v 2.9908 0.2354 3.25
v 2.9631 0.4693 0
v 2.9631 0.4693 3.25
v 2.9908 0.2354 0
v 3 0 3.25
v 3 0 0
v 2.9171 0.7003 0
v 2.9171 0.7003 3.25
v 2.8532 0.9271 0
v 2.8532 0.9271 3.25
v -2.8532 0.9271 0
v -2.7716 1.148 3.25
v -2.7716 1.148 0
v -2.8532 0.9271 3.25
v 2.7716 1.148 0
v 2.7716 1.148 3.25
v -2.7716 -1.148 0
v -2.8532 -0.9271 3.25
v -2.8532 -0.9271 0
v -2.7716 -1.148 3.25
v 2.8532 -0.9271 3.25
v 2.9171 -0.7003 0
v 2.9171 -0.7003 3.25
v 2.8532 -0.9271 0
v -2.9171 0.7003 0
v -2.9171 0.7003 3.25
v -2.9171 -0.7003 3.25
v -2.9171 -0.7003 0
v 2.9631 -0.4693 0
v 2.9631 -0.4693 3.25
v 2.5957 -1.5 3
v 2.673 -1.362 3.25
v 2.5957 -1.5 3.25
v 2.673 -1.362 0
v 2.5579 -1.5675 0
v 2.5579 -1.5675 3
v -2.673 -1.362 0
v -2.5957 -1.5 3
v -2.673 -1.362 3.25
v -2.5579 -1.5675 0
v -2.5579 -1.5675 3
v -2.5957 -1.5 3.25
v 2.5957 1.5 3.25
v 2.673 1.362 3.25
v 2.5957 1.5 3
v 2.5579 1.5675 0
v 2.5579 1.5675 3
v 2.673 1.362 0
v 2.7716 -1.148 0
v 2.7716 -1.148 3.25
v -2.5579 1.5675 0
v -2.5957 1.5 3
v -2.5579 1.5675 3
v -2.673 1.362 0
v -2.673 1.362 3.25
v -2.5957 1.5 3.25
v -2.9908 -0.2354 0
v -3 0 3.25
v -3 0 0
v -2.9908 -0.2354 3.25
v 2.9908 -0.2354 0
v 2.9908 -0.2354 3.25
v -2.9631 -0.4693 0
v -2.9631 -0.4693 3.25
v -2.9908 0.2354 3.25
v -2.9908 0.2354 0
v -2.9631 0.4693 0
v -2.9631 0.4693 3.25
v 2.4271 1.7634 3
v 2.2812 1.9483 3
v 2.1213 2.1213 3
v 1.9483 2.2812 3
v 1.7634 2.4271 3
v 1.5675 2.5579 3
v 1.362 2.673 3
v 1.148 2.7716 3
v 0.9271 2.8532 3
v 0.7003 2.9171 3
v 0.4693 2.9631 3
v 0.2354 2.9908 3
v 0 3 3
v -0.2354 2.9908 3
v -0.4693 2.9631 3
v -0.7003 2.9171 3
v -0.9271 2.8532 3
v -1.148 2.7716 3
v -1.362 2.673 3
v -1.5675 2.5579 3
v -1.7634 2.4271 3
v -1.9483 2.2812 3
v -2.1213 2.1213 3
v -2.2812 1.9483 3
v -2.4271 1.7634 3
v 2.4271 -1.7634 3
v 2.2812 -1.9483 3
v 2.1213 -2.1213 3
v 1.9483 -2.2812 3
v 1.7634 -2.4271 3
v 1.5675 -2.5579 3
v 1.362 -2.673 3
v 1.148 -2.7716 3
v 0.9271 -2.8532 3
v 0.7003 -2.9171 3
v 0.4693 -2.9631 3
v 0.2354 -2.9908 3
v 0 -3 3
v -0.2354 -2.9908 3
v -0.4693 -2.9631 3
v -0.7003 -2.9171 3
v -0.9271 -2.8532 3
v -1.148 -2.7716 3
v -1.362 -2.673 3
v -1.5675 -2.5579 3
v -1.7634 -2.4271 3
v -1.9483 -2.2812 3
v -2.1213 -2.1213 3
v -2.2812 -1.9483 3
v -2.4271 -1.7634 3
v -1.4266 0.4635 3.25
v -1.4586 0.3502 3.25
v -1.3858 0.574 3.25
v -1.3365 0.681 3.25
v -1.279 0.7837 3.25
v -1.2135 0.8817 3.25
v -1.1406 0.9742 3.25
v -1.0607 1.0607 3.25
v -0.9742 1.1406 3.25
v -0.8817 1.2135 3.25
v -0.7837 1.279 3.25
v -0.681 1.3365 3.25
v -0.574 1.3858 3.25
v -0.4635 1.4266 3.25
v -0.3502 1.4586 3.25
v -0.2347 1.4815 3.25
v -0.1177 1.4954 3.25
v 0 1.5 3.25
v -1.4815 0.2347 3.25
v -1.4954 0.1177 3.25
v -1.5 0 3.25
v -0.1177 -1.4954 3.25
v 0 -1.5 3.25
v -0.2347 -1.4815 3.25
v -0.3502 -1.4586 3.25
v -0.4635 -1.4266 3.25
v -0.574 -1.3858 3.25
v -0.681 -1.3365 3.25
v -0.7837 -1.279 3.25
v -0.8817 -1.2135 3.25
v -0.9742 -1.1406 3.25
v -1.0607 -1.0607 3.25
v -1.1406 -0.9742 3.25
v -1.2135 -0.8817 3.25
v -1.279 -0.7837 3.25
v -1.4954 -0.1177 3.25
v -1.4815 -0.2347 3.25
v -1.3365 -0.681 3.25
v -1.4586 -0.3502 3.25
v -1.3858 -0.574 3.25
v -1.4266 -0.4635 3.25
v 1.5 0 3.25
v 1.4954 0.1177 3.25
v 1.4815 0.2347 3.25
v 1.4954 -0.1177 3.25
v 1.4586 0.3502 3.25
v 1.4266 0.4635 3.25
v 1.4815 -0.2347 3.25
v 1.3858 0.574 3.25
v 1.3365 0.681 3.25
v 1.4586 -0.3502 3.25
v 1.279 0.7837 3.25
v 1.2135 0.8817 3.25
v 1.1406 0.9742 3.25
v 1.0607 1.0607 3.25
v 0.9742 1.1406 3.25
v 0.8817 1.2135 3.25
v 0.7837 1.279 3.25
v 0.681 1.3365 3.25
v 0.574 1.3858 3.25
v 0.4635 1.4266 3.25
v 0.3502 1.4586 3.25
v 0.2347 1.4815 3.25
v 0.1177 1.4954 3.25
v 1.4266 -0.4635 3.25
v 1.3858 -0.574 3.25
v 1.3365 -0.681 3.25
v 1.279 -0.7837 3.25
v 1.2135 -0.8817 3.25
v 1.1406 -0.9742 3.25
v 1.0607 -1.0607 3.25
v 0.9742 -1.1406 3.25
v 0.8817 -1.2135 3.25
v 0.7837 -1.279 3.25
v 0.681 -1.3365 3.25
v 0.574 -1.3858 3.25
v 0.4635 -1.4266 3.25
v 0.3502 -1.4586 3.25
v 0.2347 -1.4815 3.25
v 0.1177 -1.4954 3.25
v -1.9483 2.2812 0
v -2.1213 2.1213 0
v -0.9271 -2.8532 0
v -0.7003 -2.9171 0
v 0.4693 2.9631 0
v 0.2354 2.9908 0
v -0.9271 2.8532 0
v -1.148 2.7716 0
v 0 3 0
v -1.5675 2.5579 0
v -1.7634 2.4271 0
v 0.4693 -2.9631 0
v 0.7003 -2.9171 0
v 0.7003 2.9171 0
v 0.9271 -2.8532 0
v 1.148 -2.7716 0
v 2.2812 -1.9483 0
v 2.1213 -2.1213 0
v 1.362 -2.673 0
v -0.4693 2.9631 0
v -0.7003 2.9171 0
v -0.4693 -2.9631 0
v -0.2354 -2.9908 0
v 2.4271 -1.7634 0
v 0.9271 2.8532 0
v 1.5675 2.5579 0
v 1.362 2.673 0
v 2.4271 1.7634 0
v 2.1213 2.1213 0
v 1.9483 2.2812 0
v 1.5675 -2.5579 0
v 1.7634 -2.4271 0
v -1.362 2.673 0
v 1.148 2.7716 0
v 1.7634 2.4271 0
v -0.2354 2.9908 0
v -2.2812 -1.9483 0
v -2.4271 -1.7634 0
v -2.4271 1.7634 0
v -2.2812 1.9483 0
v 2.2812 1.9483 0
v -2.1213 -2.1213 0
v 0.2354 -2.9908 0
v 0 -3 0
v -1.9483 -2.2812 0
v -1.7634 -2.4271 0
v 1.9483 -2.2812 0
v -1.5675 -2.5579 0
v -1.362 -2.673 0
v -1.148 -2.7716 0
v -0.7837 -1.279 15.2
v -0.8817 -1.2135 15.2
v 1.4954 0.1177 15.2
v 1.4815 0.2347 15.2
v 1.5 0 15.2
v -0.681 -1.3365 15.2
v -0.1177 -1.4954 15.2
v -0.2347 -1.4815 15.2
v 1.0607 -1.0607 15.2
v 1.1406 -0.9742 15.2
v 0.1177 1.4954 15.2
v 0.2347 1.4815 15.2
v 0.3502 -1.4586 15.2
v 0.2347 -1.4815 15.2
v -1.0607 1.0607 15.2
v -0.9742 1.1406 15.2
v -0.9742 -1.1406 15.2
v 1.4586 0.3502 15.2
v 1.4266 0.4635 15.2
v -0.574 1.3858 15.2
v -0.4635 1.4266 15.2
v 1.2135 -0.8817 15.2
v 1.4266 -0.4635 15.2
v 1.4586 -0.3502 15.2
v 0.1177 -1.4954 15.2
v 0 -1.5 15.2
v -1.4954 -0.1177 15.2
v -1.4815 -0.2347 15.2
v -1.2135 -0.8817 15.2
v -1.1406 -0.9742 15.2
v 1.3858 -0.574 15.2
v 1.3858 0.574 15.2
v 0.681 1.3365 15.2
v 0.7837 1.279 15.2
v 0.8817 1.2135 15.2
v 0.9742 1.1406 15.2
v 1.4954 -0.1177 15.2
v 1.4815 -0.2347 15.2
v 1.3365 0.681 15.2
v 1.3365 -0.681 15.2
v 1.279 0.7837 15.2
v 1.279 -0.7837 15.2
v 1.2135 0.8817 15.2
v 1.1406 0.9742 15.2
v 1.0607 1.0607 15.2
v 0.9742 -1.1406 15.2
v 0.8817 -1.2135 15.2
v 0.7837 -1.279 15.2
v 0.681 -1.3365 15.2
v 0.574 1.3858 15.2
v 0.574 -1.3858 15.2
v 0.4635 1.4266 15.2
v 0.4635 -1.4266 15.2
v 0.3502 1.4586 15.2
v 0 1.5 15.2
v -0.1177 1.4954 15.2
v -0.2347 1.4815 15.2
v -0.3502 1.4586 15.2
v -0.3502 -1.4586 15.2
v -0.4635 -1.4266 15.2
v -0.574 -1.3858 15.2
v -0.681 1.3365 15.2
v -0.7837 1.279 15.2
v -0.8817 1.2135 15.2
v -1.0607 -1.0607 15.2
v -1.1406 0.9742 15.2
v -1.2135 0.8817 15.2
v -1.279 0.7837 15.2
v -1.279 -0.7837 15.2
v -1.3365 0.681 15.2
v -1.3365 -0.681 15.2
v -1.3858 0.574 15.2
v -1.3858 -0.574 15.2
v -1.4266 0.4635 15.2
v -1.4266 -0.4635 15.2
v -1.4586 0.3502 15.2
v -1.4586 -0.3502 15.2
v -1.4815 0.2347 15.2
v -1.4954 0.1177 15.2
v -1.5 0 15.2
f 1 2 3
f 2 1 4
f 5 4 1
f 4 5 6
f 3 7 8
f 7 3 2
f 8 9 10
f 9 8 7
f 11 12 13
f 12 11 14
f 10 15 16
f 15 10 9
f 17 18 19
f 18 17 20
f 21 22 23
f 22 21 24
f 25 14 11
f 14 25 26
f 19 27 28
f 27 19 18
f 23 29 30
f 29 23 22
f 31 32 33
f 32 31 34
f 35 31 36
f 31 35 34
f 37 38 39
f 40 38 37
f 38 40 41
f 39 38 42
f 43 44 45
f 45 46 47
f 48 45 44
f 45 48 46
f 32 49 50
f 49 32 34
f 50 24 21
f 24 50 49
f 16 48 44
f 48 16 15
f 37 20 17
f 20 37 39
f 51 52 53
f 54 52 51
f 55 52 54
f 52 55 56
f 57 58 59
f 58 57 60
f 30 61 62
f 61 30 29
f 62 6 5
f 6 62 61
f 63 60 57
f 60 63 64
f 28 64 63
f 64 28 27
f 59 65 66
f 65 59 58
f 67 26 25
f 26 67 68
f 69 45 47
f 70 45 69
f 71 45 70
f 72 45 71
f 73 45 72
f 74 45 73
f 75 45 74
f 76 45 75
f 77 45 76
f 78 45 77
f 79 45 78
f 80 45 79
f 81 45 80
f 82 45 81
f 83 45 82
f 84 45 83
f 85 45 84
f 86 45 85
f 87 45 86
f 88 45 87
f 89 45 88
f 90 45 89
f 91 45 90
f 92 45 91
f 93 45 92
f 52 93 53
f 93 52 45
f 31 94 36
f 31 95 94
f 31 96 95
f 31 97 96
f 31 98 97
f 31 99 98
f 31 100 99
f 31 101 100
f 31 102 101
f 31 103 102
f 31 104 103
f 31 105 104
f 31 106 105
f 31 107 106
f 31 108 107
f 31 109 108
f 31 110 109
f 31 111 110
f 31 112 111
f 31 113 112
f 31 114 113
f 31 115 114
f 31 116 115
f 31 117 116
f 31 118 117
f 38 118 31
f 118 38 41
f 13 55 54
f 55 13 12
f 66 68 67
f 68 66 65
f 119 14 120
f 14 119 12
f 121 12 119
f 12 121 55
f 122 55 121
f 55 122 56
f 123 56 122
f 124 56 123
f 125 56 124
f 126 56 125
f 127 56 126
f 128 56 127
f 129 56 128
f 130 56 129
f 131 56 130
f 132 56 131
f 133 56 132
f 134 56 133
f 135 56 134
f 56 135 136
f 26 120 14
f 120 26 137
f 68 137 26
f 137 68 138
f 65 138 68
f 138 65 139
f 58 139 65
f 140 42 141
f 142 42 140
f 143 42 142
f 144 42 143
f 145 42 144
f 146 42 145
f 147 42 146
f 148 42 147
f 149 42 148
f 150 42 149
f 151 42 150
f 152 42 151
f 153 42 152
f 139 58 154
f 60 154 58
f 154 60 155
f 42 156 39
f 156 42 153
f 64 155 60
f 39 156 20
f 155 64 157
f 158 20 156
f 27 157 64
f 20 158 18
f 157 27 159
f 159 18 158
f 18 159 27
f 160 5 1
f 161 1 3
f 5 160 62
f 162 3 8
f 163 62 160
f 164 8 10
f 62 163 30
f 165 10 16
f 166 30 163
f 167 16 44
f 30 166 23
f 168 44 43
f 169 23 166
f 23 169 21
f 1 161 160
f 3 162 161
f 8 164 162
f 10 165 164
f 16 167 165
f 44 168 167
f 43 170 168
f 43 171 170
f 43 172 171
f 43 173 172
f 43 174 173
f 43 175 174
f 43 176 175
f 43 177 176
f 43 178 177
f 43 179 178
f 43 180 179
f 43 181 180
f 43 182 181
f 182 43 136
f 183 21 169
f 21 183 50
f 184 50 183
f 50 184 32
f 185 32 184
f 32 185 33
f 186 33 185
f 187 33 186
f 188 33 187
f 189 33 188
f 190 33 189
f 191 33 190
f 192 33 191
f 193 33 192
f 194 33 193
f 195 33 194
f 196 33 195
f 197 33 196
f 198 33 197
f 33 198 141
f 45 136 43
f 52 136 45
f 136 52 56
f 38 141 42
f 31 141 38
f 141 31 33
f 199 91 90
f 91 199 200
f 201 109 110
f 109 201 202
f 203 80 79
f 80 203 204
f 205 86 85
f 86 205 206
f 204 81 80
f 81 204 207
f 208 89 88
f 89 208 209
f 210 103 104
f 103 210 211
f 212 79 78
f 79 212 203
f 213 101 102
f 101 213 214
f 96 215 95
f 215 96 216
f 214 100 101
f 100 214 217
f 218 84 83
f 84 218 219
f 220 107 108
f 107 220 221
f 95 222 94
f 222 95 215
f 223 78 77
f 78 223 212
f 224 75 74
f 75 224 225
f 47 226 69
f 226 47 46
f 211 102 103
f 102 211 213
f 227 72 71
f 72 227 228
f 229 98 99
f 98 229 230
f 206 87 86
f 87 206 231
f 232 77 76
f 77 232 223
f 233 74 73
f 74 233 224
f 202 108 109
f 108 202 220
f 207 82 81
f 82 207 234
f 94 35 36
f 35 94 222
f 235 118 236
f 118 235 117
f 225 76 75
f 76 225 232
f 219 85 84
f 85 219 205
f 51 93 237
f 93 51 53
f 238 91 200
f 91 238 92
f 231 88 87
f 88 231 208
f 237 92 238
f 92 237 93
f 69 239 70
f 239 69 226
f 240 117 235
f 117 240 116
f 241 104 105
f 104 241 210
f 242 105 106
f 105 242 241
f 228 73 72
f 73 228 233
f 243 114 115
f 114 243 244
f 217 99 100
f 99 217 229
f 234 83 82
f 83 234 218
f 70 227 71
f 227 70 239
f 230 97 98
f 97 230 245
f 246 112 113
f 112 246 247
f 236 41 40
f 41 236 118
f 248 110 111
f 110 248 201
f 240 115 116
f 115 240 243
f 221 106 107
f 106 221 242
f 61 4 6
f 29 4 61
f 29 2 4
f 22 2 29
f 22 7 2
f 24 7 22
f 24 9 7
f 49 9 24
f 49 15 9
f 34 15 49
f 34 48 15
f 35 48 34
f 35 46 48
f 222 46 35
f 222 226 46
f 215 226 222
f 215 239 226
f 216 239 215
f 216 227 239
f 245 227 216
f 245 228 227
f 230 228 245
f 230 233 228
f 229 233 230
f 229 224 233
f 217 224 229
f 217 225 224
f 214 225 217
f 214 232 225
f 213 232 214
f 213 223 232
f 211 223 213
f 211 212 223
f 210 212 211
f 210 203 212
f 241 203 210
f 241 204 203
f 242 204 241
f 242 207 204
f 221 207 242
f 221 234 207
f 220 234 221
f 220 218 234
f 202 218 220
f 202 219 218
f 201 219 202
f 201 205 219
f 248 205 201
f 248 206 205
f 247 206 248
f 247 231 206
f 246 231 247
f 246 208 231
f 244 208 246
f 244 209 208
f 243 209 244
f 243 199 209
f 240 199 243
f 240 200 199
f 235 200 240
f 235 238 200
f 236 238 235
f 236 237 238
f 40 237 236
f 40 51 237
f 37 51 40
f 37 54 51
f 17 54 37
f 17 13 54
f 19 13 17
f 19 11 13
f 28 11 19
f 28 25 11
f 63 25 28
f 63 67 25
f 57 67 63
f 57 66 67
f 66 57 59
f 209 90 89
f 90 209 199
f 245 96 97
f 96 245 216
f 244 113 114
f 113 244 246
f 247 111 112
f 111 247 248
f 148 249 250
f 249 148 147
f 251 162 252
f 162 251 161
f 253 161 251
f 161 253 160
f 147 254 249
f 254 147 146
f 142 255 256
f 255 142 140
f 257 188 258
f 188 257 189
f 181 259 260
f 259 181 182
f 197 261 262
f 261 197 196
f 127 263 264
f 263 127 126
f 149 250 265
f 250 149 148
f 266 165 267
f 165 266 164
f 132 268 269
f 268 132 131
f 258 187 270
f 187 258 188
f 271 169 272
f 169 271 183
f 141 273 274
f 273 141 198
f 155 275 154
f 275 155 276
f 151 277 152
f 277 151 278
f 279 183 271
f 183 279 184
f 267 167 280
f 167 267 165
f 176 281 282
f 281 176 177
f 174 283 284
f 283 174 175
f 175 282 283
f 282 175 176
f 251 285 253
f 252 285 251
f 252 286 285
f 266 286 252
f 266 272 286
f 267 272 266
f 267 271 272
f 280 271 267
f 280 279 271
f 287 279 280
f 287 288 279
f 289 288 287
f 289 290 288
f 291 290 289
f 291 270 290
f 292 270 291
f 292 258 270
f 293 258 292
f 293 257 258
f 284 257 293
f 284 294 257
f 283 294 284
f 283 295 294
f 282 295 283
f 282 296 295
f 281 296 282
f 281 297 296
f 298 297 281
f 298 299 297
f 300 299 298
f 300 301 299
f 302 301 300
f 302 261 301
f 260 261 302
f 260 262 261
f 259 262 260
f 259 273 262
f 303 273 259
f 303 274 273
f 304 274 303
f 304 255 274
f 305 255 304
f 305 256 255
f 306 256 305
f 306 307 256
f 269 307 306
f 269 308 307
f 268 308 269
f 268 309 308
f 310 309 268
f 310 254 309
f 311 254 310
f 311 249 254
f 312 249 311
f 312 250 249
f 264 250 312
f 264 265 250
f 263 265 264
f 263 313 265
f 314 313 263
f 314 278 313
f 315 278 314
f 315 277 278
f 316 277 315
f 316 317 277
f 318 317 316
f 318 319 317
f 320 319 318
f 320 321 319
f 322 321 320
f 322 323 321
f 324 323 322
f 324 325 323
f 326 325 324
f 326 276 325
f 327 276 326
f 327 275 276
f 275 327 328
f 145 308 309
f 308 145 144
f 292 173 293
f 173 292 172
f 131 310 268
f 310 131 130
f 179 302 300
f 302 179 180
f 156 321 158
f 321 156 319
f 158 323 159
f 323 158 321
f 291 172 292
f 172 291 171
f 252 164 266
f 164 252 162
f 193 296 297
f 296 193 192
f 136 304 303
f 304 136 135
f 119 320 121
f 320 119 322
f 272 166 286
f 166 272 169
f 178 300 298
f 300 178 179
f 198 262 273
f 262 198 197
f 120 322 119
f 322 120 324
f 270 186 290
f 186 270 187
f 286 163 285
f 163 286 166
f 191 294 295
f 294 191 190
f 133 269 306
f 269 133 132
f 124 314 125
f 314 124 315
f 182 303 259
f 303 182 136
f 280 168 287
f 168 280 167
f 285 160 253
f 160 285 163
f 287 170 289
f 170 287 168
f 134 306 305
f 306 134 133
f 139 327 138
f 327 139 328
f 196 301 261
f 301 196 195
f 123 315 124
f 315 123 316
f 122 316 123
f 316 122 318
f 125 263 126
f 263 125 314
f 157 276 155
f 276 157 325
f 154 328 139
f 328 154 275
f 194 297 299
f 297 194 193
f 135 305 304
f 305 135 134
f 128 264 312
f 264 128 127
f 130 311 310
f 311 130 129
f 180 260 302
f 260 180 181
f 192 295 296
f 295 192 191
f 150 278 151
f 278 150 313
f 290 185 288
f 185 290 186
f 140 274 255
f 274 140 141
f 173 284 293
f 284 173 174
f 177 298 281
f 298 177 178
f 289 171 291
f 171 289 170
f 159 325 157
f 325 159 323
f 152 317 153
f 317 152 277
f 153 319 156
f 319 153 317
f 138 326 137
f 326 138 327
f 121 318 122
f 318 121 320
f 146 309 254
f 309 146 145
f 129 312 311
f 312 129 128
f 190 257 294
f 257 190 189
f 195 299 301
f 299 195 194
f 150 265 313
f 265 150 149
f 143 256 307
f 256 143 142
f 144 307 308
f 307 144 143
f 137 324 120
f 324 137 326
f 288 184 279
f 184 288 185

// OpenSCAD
/*
makerspace workshop 2023-09-02
author: andimoto
*/
$fn=80;

/* [box dimensions] */
innerBoxX = 100;
innerBoxY = 100;
innerBoxZ = 60;

wallThickness = 6;
bottomThickness = 5;

edgeRadius = 5;

/* [lid] */
lidThickness = 5;
lidClearance = 0.4;
lidFixZ = 1;

/* [screw dimensions] */
screwDia = 3;
screwDiaTolerance = 0.2;
screwLen = 12;
screwHeadDia = 6;
screwHeadThick = 3;
insertDia = 4.4;

/* [simulation preferences] */
showFullAssembly = false;
showAnimation1 = false;
showAnimation2 = false;
showBox = false;
showLid = false;
showLogo = false;

/* [other parameters] */
extra = 0.01;

// screw placement
screwPlacement = [
[wallThickness-1,wallThickness-1],
[innerBoxX+wallThickness+1,wallThickness-1],
[innerBoxX+wallThickness+1,innerBoxY+wallThickness+1],
[wallThickness-1,innerBoxY+wallThickness+1]
];


if(showFullAssembly==true)
{
  assembly();
}

if(showAnimation1 == true)
{
  animation1();
}

if(showAnimation2 == true)
{
  animation2();
}

if(showBox == true)
{
  box();
}

if(showLid == true)
{
  lid();
}

if(showLogo == true)
{
  logo();
}


module assembly()
{
  box();

  translate([0,0,bottomThickness+innerBoxZ])
  translate([0,0,lidThickness])
  mirror([0,0,1])
  lid();

  translate([0,0,innerBoxZ+bottomThickness+lidFixZ])
  translate([0,0,screwHeadThick+0.2])
  mirror([0,0,1])
  color("Silver")
  screws(screwDia,screwHeadDia,screwHeadThick);
}


module animation1()
{
  box();

  translate([0,0,bottomThickness+innerBoxZ+20-$t*20])
  translate([0,0,lidThickness])
  mirror([0,0,1])
  lid();

}


module animation2()
{
  box();

  translate([0,0,bottomThickness+innerBoxZ])
  translate([0,0,lidThickness])
  mirror([0,0,1])
  lid();

  translate([0,0,20-$t*20])
  translate([0,0,innerBoxZ+bottomThickness+lidFixZ+1])
  translate([0,0,screwHeadThick+0.2])
  mirror([0,0,1])
  color("Silver")
  screws(screwDia,screwHeadDia,screwHeadThick);
}

module box()
{
  difference()
  {
    translate([edgeRadius,edgeRadius,0])
    minkowski()
    {
      cube([innerBoxX+wallThickness*2-edgeRadius*2,
        innerBoxY+wallThickness*2-edgeRadius*2,
        innerBoxZ+bottomThickness-extra*2]);
      cylinder(r=edgeRadius, h=extra);
    }

    translate([edgeRadius+wallThickness,edgeRadius+wallThickness,bottomThickness+extra])
    minkowski()
    {
      cube([innerBoxX-edgeRadius*2,
        innerBoxY-edgeRadius*2,
        innerBoxZ-extra*2]);
      cylinder(r=edgeRadius, h=extra);
    }
    translate([0,0,innerBoxZ+bottomThickness])
    translate([0,0,screwHeadThick+0.3])
    mirror([0,0,1])
    screws(insertDia,screwHeadDia,screwHeadThick);
    /* screws(screwDia+screwDiaTolerance,screwHeadDia,screwHeadThick); */
  }
}

/* box(); */


module lid()
{
  difference()
  {
    union()
    {
      translate([edgeRadius,edgeRadius,0])
      minkowski()
      {
        cube([innerBoxX+wallThickness*2-edgeRadius*2,
          innerBoxY+wallThickness*2-edgeRadius*2,
          lidThickness-extra*2]);
        cylinder(r=edgeRadius, h=extra);
      }
      translate([edgeRadius+wallThickness+lidClearance,
        edgeRadius+wallThickness+lidClearance,0])
      minkowski()
      {
        cube([innerBoxX-lidClearance*2-edgeRadius*2,
          innerBoxY-lidClearance*2-edgeRadius*2,
          lidFixZ+lidThickness-extra*2]);
        cylinder(r=edgeRadius, h=extra);
      }
    } /* union */

    translate([0,0,-extra])
    screws(screwDia+screwDiaTolerance*2,screwHeadDia,screwHeadThick+0.5);

    translate([(innerBoxX+wallThickness+edgeRadius)/2,(innerBoxY+wallThickness+edgeRadius)/2,-extra])
    logo(height=1,sizeX=innerBoxX, sizeY=innerBoxY);
  }
}


/* screws(screwDia+screwDiaTolerance,screwHeadDia,screwHeadThick+0.5); */
module screws(screwD = 3, screwHeadD = 6, screwHeadThickness = 3)
{
  for (p=screwPlacement) {
    translate([p[0],p[1],0])
    screw(screwD, screwHeadD, screwHeadThickness);
  }

}

screw(screwD=3, screwHeadD = 6, screwHeadThickness =3);
module screw(screwD = 3, screwHeadD = 6, screwHeadThickness = 3)
{
  union()
  {
    /* head */
    cylinder(r=screwHeadD/2, h=screwHeadThickness);
    /* screw */
    translate([0,0,screwHeadThickness+0.2])
    cylinder(r = screwD/2, h=screwLen);

    translate([0,0,screwHeadThickness])
    intersection()
    {
      cylinder(r=screwHeadD/2,h=0.3);
      translate([0,0,0.1])
        cube([screwHeadD,screwD,0.3],center=true);
    }
  }
}

/* logo(height=2, sizeX=50, sizeY=50); */
module logo(height=10, sizeX=10, sizeY=10)
{

}
